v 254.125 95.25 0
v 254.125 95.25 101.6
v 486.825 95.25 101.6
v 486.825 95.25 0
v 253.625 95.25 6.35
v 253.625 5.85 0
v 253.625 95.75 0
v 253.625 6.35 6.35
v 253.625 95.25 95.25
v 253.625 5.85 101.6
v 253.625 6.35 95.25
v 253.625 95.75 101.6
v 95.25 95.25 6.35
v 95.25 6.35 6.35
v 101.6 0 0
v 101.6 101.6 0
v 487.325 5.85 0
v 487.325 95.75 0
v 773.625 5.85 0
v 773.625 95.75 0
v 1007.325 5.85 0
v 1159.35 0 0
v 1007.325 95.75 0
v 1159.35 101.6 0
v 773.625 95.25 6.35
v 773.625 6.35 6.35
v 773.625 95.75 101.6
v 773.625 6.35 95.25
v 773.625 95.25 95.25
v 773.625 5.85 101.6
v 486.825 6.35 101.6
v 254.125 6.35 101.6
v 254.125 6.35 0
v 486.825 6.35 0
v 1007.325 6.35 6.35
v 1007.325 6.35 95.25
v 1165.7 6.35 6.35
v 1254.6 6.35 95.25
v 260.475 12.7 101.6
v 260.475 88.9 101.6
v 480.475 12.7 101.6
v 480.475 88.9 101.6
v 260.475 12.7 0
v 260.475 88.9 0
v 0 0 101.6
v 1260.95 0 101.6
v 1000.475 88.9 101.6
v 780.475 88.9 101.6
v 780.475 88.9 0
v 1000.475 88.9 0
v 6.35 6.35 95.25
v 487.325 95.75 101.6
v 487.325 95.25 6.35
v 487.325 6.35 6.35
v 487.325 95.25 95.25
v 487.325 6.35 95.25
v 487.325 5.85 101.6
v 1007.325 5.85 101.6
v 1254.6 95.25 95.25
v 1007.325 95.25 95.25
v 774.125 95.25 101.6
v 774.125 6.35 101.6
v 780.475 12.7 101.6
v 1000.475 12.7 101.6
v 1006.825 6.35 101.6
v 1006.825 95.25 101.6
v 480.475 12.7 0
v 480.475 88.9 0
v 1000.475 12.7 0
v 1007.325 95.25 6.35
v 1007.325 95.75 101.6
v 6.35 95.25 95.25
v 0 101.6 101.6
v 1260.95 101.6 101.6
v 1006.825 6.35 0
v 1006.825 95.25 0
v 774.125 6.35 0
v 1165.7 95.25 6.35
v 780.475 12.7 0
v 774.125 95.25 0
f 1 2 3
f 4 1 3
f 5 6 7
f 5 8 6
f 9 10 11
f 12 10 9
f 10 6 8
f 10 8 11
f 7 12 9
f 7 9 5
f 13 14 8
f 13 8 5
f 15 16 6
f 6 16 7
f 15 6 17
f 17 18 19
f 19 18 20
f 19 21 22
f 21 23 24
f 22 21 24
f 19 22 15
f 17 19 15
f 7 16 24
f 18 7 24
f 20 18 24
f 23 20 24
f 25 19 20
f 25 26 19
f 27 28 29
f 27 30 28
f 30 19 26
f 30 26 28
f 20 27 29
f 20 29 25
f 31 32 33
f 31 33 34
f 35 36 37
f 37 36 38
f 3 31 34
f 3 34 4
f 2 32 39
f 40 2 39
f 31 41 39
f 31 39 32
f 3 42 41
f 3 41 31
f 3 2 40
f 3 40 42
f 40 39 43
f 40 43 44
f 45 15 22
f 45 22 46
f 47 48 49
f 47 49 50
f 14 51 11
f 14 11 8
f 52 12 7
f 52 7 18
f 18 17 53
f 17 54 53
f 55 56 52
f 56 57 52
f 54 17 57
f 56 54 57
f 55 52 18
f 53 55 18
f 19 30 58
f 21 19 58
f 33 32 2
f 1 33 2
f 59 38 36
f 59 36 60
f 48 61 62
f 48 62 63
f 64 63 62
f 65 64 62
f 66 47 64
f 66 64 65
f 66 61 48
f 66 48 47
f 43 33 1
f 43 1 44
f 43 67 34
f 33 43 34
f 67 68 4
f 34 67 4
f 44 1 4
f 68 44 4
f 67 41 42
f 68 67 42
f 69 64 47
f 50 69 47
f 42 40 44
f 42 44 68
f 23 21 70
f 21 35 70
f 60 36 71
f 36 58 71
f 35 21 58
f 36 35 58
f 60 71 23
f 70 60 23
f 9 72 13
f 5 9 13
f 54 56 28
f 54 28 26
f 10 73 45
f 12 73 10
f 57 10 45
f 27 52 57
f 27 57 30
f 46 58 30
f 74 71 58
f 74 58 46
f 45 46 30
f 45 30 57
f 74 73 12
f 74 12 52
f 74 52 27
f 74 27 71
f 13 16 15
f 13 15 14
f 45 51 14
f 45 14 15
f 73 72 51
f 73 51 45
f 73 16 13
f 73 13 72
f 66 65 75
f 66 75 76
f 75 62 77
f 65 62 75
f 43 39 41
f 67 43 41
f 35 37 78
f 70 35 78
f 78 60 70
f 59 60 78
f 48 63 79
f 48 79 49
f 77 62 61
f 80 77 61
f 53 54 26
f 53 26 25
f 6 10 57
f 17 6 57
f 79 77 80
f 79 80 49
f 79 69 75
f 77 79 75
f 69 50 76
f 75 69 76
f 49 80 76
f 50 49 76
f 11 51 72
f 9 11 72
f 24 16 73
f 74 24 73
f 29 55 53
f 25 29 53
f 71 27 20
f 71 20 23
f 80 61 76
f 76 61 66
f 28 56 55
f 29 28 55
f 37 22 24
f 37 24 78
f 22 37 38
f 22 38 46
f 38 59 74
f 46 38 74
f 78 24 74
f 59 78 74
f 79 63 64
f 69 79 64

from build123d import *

# Parameters (mm, degrees)
CROQUIS1_W              = 1260.95
CROQUIS1_H              = 101.6
SALIENTE_EXTRUIR1_DEPTH = 101.6
CROQUIS5_W              = 88.9
CROQUIS5_H              = 88.9
CORTAR_EXTRUIR4_DEPTH   = 1260.95
CORTAR_EXTRUIR5_DEPTH   = 101.6
CORTAR_EXTRUIR6_REACH   = 1271.11
CROQUIS7_W              = 220
CROQUIS7_H              = 76.2
CROQUIS8_W              = 232.7
CROQUIS8_H              = 88.9
CROQUIS8_W_2            = 220
CROQUIS8_H_2            = 76.2
SALIENTE_EXTRUIR2_DEPTH = 101.6
CORTAR_EXTRUIR7_REACH   = 1271.11
CROQUIS9_W              = 233.7
CROQUIS9_H              = 89.9
CROQUIS9_W_2            = 232.7
CROQUIS9_H_2            = 88.9


with BuildPart() as part:
    # Croquis1 → Saliente-Extruir1 (new body)
    with BuildSketch(Plane.XY):
        with Locations((630.475, 50.8)):
            Rectangle(CROQUIS1_W, CROQUIS1_H)
    extrude(amount=SALIENTE_EXTRUIR1_DEPTH)

    # Croquis5 → Cortar-Extruir4 (cut)
    with BuildSketch(Plane(origin=(1260.95, 0, 0), x_dir=(0, 0, -1), z_dir=(1, 0, 0))):
        with Locations((-50.8, 50.8)):
            Rectangle(CROQUIS5_W, CROQUIS5_H)
    extrude(amount=-CORTAR_EXTRUIR4_DEPTH, mode=Mode.SUBTRACT)

    # Croquis6 → Cortar-Extruir5 (cut)
    with BuildSketch(Plane(origin=(0, 101.6, 0), x_dir=(1, 0, 0), z_dir=(0, 1, 0))):
        Polygon((0, 0), (101.6, 0), (0, -101.6), align=None)
        Polygon((1260.95, -101.6), (1260.95, 0), (1159.35, 0), align=None)
    extrude(amount=-CORTAR_EXTRUIR5_DEPTH, mode=Mode.SUBTRACT)

    # Cortar-Extruir6: up to this face of the body (flat: up to its plane)
    cortar_extruir6_end = Plane(part.part.faces().sort_by_distance((630.475, 50.8, 0))[0])
    # Croquis7 → Cortar-Extruir6 (cut, up to the picked face)
    with BuildSketch(Plane.XY.offset(101.6), mode=Mode.PRIVATE) as cortar_extruir6_sk1:
        with Locations((370.475, 50.8)):
            Rectangle(CROQUIS7_W, CROQUIS7_H)
    cortar_extruir6_tool1 = split(extrude(cortar_extruir6_sk1.sketch, amount=-CORTAR_EXTRUIR6_REACH, mode=Mode.PRIVATE), bisect_by=cortar_extruir6_end, keep=Keep.BOTH, mode=Mode.PRIVATE)
    # Croquis7 → Cortar-Extruir6 (cut, up to the picked face)
    with BuildSketch(Plane.XY.offset(101.6), mode=Mode.PRIVATE) as cortar_extruir6_sk2:
        with Locations((890.475, 50.8)):
            Rectangle(CROQUIS7_W, CROQUIS7_H)
    cortar_extruir6_tool2 = split(extrude(cortar_extruir6_sk2.sketch, amount=-CORTAR_EXTRUIR6_REACH, mode=Mode.PRIVATE), bisect_by=cortar_extruir6_end, keep=Keep.BOTH, mode=Mode.PRIVATE)
    add(cortar_extruir6_tool1.solids().sort_by(Axis((370.475, 50.8, 101.6), (0, 0, -1)))[0], mode=Mode.SUBTRACT)
    add(cortar_extruir6_tool2.solids().sort_by(Axis((890.475, 50.8, 101.6), (0, 0, -1)))[0], mode=Mode.SUBTRACT)

    # Croquis8 → Saliente-Extruir2 (add)
    # profile 1 of 2: a face of its own
    with BuildSketch(Plane.XY.offset(101.6)):
        with Locations((370.475, 50.8)):
            Rectangle(CROQUIS8_W, CROQUIS8_H)
        with Locations((370.475, 50.8)):
            Rectangle(CROQUIS8_W_2, CROQUIS8_H_2, mode=Mode.SUBTRACT)
    # profile 2 of 2: a face of its own
    with BuildSketch(Plane.XY.offset(101.6)):
        with Locations((890.475, 50.8)):
            Rectangle(CROQUIS8_W, CROQUIS8_H)
        with Locations((890.475, 50.8)):
            Rectangle(CROQUIS8_W_2, CROQUIS8_H_2, mode=Mode.SUBTRACT)
    extrude(amount=-SALIENTE_EXTRUIR2_DEPTH)

    # Cortar-Extruir7: up to this face of the body (flat: up to its plane)
    cortar_extruir7_end = Plane(part.part.faces().sort_by_distance((630.475, 50.8, 0))[0])
    # Croquis9 → Cortar-Extruir7 (cut, up to the picked face)
    with BuildSketch(Plane.XY.offset(101.6), mode=Mode.PRIVATE) as cortar_extruir7_sk1:
        with Locations((370.475, 50.8)):
            Rectangle(CROQUIS9_W, CROQUIS9_H)
        with Locations((370.475, 50.8)):
            Rectangle(CROQUIS9_W_2, CROQUIS9_H_2, mode=Mode.SUBTRACT)
    cortar_extruir7_tool1 = split(extrude(cortar_extruir7_sk1.sketch, amount=-CORTAR_EXTRUIR7_REACH, mode=Mode.PRIVATE), bisect_by=cortar_extruir7_end, keep=Keep.BOTH, mode=Mode.PRIVATE)
    # Croquis9 → Cortar-Extruir7 (cut, up to the picked face)
    with BuildSketch(Plane.XY.offset(101.6), mode=Mode.PRIVATE) as cortar_extruir7_sk2:
        with Locations((890.475, 50.8)):
            Rectangle(CROQUIS9_W, CROQUIS9_H)
        with Locations((890.475, 50.8)):
            Rectangle(CROQUIS9_W_2, CROQUIS9_H_2, mode=Mode.SUBTRACT)
    cortar_extruir7_tool2 = split(extrude(cortar_extruir7_sk2.sketch, amount=-CORTAR_EXTRUIR7_REACH, mode=Mode.PRIVATE), bisect_by=cortar_extruir7_end, keep=Keep.BOTH, mode=Mode.PRIVATE)
    add(cortar_extruir7_tool1.solids().sort_by(Axis((370.475, 6.100395, 101.6), (0, 0, -1)))[0], mode=Mode.SUBTRACT)
    add(cortar_extruir7_tool2.solids().sort_by(Axis((1007.074605, 50.8, 101.6), (0, 0, -1)))[0], mode=Mode.SUBTRACT)


with BuildPart() as cortar_extruir7_piece_1:
    # of the separate pieces the step leaves, piece 1, a body of its own (cortar_extruir7_pieces)
    add(part.part.solids().sort_by_distance((101.6, 0, 0))[0])


with BuildPart() as cortar_extruir7_piece_2:
    # of the separate pieces the step leaves, piece 2, a body of its own (cortar_extruir7_pieces)
    add(part.part.solids().sort_by_distance((486.825, 95.25, 0))[0])


with BuildPart() as cortar_extruir7_piece_3:
    # of the separate pieces the step leaves, piece 3, a body of its own (cortar_extruir7_pieces)
    add(part.part.solids().sort_by_distance((1006.825, 95.25, 0))[0])


solid = Compound([cortar_extruir7_piece_1.part, cortar_extruir7_piece_2.part, cortar_extruir7_piece_3.part])
